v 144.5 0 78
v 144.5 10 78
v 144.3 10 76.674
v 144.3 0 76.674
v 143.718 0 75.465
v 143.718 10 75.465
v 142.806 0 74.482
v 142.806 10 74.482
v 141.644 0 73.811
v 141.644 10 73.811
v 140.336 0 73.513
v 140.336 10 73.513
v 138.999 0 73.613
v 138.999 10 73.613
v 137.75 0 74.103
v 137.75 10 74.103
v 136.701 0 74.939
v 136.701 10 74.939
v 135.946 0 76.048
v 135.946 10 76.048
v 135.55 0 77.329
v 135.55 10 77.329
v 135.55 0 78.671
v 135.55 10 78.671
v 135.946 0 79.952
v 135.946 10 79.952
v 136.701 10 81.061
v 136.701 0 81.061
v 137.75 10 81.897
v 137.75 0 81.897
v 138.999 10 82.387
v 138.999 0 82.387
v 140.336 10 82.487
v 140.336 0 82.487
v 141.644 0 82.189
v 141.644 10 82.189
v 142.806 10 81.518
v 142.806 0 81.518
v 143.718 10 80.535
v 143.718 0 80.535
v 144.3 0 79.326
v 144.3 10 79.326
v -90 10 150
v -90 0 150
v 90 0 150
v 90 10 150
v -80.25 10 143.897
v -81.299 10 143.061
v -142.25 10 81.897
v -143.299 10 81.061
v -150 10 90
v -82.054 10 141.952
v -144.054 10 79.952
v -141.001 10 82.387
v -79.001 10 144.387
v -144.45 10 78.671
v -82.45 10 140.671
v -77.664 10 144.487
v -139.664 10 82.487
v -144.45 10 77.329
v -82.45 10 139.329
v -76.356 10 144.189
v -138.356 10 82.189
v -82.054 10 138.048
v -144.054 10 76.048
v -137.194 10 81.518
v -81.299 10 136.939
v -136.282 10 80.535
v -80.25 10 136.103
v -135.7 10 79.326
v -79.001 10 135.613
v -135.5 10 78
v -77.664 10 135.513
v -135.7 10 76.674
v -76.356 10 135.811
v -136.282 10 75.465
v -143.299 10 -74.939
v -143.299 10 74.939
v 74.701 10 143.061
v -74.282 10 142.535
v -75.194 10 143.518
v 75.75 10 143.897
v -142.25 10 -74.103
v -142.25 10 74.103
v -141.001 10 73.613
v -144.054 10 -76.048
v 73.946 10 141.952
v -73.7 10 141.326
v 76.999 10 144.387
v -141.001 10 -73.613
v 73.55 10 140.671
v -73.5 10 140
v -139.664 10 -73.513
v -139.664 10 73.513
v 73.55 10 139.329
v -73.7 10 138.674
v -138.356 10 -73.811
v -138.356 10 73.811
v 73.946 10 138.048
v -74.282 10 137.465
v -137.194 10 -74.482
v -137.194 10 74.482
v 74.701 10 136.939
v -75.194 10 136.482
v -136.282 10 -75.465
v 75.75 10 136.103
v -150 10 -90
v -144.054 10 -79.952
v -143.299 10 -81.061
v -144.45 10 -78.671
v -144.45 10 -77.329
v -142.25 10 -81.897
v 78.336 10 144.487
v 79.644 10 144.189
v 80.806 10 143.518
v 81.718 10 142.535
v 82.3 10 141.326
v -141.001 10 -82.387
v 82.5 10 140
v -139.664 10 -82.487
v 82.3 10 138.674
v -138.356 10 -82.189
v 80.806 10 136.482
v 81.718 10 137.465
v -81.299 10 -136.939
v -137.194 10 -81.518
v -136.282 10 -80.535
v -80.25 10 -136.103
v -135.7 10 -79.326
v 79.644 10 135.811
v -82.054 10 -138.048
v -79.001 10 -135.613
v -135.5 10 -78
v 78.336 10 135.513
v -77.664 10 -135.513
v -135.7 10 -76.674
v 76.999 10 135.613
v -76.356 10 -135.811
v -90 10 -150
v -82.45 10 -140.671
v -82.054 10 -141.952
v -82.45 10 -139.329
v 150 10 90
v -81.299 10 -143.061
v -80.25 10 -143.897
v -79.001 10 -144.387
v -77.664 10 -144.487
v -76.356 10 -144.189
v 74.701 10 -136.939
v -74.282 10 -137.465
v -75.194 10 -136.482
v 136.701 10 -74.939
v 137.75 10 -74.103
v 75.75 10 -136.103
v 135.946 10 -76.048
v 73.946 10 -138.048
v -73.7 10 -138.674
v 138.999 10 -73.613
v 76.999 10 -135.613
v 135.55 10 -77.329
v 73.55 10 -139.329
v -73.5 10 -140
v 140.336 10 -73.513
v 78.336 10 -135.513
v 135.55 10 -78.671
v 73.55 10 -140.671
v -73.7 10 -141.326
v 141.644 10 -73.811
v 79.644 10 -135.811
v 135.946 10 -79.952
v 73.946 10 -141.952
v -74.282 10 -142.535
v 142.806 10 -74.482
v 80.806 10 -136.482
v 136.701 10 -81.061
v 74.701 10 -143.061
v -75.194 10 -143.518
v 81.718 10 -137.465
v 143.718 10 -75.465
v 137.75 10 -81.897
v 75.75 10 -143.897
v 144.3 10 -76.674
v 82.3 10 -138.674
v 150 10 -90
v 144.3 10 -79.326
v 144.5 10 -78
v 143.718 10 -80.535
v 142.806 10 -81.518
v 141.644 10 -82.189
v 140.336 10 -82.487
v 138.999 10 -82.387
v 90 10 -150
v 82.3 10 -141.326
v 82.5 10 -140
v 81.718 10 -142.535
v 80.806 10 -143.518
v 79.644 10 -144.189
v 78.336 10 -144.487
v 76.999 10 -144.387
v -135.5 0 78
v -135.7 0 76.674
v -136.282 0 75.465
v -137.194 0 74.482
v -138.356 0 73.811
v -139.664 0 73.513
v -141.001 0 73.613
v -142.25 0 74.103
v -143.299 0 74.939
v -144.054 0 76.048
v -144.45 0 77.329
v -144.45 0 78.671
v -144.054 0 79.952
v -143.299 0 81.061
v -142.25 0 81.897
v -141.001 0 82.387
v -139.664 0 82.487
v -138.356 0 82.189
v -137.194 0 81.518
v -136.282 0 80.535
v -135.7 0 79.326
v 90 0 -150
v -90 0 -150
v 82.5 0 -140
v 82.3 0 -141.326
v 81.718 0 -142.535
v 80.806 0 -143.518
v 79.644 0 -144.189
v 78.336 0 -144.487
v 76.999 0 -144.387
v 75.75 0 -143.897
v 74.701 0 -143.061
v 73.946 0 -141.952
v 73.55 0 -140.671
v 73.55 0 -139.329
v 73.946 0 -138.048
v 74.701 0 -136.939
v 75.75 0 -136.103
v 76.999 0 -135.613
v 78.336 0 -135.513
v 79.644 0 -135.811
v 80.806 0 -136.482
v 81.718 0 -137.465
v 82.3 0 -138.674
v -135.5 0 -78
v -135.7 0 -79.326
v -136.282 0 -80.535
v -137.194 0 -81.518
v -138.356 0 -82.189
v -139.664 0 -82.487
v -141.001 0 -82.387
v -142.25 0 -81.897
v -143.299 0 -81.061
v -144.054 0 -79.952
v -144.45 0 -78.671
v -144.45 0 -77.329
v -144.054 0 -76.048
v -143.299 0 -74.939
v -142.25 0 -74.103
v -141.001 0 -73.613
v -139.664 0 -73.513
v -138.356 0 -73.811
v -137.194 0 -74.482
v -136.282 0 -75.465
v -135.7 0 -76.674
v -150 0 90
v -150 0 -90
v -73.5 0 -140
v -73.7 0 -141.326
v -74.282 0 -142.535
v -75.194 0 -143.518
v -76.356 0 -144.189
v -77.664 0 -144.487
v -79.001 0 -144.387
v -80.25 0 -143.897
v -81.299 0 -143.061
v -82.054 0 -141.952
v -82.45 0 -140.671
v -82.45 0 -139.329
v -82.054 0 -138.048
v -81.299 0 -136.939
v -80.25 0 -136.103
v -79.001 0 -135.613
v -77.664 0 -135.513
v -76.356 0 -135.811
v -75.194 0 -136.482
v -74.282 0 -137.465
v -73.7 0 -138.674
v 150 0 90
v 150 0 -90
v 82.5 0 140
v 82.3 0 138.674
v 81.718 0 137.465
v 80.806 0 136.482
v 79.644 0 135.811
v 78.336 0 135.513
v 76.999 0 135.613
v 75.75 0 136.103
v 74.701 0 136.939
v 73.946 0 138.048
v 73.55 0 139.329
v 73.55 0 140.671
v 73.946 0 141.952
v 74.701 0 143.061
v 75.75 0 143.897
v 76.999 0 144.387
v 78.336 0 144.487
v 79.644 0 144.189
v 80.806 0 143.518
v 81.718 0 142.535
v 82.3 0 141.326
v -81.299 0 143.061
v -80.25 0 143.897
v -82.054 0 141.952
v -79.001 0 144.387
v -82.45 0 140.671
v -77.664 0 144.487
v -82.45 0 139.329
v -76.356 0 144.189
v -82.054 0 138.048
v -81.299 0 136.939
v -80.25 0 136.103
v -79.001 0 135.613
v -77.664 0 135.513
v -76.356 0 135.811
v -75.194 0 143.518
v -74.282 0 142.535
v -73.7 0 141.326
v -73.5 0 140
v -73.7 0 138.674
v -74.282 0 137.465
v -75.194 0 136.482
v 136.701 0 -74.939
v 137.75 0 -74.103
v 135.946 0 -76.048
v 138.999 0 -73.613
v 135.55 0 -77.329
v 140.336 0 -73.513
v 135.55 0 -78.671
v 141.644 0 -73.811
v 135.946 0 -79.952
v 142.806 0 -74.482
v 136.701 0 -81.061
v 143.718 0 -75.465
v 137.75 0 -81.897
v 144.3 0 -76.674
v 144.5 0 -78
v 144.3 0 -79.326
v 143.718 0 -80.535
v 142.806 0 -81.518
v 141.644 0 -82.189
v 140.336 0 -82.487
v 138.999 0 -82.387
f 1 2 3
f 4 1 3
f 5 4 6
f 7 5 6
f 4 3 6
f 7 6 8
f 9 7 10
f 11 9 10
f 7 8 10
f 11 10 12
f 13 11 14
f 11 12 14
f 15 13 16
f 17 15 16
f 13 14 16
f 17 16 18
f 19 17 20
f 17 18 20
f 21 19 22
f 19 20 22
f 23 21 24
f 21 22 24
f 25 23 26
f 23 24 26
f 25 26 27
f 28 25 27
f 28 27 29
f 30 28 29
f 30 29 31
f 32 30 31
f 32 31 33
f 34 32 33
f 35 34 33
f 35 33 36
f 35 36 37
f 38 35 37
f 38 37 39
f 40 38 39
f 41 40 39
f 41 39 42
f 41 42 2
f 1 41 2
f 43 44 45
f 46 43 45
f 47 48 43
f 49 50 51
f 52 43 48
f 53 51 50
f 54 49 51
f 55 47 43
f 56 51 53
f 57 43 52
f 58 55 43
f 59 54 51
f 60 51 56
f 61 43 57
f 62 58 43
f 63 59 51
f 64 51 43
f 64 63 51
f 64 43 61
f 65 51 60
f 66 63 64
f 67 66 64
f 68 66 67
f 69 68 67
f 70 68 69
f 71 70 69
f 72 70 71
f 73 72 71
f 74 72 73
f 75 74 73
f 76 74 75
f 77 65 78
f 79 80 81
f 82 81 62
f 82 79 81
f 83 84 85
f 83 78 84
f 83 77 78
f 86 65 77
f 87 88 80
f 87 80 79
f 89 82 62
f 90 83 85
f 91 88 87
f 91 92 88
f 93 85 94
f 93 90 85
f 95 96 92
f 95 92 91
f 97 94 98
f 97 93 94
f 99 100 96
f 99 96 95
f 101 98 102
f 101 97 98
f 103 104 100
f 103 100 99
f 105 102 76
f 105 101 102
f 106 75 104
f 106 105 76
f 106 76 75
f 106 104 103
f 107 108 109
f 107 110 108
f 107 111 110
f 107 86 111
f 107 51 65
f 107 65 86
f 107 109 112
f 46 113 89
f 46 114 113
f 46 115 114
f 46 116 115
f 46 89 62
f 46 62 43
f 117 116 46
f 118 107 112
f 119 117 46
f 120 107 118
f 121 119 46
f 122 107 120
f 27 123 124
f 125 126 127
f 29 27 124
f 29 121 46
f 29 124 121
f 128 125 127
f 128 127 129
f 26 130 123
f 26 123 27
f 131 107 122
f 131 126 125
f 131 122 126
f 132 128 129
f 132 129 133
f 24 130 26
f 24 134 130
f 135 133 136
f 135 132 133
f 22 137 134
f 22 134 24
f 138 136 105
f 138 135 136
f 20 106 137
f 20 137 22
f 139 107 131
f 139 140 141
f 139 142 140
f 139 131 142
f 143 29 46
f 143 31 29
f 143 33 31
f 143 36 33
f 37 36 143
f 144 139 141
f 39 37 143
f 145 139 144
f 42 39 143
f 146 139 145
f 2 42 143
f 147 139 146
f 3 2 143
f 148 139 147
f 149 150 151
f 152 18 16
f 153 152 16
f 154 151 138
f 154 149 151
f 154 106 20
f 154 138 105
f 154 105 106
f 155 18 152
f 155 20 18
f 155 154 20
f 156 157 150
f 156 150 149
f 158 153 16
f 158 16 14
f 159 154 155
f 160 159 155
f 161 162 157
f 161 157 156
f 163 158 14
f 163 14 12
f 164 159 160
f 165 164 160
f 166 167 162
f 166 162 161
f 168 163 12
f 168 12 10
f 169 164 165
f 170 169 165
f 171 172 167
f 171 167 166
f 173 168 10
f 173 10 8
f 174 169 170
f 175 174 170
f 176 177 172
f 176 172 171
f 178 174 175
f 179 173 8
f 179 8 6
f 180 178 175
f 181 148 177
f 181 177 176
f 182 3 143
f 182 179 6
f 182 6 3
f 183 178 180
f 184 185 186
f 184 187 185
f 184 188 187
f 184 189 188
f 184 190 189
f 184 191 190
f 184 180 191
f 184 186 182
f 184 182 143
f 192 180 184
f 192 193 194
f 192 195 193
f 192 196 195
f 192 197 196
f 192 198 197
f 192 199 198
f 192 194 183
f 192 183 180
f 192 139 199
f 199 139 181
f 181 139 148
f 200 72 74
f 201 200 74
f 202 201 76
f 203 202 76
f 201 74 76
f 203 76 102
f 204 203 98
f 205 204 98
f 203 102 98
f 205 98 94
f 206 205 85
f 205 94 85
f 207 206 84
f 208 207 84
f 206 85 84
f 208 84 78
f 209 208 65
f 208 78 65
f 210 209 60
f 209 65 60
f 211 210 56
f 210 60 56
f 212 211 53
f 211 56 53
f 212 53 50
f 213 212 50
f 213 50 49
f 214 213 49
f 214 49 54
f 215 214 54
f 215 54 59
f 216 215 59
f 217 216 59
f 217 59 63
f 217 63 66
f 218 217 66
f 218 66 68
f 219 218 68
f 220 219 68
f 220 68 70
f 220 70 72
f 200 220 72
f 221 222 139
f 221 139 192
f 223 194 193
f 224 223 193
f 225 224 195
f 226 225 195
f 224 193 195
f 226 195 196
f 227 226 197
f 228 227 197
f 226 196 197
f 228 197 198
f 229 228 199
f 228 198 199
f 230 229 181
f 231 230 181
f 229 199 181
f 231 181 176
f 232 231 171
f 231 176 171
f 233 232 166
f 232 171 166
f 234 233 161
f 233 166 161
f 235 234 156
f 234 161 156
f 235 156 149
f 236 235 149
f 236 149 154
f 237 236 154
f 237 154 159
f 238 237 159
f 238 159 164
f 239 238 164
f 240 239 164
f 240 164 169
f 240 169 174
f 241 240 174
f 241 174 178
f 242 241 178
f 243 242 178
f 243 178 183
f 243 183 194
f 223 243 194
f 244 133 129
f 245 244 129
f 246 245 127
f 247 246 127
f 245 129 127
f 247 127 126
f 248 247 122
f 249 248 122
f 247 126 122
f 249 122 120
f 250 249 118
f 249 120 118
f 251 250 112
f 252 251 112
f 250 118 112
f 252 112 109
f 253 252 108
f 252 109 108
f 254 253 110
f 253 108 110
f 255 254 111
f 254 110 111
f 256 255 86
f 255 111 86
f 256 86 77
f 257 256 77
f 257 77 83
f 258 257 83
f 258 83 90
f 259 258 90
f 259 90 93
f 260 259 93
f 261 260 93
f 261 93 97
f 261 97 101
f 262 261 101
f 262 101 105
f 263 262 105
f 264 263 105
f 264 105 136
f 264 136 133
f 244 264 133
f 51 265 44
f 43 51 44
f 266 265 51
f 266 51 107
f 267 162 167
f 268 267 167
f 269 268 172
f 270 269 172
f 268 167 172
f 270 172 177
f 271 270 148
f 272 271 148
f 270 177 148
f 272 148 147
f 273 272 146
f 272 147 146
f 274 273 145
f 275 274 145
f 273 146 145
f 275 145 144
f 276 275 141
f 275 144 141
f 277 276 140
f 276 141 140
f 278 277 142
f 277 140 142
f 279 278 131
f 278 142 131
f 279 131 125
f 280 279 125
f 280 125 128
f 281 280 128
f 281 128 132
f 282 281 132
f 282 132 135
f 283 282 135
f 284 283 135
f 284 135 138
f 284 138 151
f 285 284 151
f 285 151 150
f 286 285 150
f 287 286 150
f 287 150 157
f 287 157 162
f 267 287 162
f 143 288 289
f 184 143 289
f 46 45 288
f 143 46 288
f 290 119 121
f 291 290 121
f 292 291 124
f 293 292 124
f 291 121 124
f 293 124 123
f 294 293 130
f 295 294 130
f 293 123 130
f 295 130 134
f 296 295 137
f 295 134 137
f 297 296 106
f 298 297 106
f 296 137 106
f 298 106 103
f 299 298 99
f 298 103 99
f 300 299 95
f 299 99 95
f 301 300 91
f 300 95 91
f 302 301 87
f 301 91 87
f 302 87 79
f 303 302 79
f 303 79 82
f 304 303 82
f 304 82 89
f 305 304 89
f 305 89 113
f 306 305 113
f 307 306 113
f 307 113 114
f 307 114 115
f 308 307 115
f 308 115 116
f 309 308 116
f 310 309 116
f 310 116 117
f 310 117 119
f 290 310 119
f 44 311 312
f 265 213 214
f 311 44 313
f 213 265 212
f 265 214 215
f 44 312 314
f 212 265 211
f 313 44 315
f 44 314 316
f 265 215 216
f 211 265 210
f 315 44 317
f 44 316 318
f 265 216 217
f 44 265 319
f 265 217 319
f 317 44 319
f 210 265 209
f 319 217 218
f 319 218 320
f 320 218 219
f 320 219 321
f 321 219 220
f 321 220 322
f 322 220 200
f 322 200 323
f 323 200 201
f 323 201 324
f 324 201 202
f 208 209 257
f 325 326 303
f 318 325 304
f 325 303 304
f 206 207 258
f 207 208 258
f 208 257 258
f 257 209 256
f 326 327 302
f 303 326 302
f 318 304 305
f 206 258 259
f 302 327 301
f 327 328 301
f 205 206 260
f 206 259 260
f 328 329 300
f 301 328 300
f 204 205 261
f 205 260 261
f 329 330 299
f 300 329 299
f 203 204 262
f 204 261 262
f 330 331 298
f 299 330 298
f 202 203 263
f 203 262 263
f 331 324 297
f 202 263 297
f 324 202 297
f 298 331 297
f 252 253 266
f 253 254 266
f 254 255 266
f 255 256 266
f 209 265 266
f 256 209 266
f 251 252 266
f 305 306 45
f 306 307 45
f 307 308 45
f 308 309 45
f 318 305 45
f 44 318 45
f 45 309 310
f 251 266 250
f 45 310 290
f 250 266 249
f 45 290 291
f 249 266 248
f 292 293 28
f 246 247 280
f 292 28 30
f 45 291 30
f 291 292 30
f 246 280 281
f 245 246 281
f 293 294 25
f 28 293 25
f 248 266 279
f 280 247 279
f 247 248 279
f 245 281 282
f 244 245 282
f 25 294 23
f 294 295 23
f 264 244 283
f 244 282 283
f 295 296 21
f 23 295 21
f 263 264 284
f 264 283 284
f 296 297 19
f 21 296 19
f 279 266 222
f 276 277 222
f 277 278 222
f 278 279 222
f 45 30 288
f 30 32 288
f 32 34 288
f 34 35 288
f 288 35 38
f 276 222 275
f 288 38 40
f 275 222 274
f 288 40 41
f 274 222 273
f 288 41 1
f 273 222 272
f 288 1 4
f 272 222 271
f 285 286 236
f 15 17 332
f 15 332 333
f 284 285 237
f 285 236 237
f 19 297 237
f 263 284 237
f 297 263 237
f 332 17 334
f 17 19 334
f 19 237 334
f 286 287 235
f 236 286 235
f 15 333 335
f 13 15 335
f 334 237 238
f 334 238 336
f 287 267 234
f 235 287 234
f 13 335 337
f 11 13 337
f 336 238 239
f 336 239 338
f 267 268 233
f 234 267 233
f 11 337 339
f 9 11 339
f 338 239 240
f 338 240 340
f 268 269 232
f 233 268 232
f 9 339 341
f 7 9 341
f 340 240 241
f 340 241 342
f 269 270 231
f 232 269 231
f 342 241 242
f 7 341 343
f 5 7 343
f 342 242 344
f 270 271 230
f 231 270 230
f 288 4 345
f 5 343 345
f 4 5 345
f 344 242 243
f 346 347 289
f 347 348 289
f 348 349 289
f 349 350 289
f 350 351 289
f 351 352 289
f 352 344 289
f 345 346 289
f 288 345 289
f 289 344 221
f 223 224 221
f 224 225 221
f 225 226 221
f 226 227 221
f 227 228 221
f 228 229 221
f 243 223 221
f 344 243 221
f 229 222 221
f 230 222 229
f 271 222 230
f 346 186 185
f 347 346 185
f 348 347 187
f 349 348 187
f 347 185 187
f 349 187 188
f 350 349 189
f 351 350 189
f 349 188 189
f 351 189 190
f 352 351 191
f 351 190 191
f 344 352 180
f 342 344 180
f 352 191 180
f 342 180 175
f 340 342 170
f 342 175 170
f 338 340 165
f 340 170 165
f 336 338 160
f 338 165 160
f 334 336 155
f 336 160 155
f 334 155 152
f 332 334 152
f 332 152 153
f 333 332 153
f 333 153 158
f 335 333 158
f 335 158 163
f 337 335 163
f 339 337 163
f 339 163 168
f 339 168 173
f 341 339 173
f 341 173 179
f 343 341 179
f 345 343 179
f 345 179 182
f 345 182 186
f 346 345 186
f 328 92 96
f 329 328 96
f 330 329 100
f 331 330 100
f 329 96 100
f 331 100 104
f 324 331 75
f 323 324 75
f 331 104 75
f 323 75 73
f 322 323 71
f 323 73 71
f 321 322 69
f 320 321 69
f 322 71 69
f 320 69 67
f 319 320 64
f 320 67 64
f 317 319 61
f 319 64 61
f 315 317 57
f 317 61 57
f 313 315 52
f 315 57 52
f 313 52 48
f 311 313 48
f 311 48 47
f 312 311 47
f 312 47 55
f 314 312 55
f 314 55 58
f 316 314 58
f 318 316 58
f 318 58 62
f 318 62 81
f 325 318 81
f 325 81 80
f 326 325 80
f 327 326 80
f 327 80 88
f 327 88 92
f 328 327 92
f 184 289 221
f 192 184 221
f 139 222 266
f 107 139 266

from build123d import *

# Parameters (mm, degrees)
SKETCH1_W           = 60
SKETCH1_H           = 180
SKETCH1_W_2         = 180
SKETCH1_H_2         = 60
BOSS_EXTRUDE1_DEPTH = 10
SKETCH2_R           = 4.5
CUT_EXTRUDE1_DEPTH  = 11


with BuildPart() as part:
    # Sketch1 → Boss-Extrude1 (new body)
    with BuildSketch(Plane(origin=(0, 0, 0), x_dir=(1, 0, 0), z_dir=(0, 1, 0))):
        with Locations((-120, 0)):
            Rectangle(SKETCH1_W, SKETCH1_H)
        Polygon((-90, -90), (-150, -90), (-90, -150), align=None)
        Polygon((-90, 90), (-90, 150), (-150, 90), align=None)
        with Locations((0, 120)):
            Rectangle(SKETCH1_W_2, SKETCH1_H_2)
        Rectangle(SKETCH1_W_2, SKETCH1_H)
        with Locations((0, -120)):
            Rectangle(SKETCH1_W_2, SKETCH1_H_2)
        Polygon((150, -90), (90, -90), (90, -150), align=None)
        with Locations((120, 0)):
            Rectangle(SKETCH1_W, SKETCH1_H)
        Polygon((150, 90), (90, 150), (90, 90), align=None)
    extrude(amount=BOSS_EXTRUDE1_DEPTH)

    # Sketch2 → Cut-Extrude1 (cut, through all)
    with BuildSketch(Plane(origin=(0, 10, 0), x_dir=(1, 0, 0), z_dir=(0, 1, 0))):
        with Locations((-78, 140)):
            Circle(SKETCH2_R)
        with Locations((-140, 78)):
            Circle(SKETCH2_R)
        with Locations((-140, -78)):
            Circle(SKETCH2_R)
        with Locations((-78, -140)):
            Circle(SKETCH2_R)
        with Locations((78, -140)):
            Circle(SKETCH2_R)
        with Locations((140, -78)):
            Circle(SKETCH2_R)
        with Locations((140, 78)):
            Circle(SKETCH2_R)
        with Locations((78, 140)):
            Circle(SKETCH2_R)
    extrude(amount=-CUT_EXTRUDE1_DEPTH, mode=Mode.SUBTRACT)


solid = part.part
